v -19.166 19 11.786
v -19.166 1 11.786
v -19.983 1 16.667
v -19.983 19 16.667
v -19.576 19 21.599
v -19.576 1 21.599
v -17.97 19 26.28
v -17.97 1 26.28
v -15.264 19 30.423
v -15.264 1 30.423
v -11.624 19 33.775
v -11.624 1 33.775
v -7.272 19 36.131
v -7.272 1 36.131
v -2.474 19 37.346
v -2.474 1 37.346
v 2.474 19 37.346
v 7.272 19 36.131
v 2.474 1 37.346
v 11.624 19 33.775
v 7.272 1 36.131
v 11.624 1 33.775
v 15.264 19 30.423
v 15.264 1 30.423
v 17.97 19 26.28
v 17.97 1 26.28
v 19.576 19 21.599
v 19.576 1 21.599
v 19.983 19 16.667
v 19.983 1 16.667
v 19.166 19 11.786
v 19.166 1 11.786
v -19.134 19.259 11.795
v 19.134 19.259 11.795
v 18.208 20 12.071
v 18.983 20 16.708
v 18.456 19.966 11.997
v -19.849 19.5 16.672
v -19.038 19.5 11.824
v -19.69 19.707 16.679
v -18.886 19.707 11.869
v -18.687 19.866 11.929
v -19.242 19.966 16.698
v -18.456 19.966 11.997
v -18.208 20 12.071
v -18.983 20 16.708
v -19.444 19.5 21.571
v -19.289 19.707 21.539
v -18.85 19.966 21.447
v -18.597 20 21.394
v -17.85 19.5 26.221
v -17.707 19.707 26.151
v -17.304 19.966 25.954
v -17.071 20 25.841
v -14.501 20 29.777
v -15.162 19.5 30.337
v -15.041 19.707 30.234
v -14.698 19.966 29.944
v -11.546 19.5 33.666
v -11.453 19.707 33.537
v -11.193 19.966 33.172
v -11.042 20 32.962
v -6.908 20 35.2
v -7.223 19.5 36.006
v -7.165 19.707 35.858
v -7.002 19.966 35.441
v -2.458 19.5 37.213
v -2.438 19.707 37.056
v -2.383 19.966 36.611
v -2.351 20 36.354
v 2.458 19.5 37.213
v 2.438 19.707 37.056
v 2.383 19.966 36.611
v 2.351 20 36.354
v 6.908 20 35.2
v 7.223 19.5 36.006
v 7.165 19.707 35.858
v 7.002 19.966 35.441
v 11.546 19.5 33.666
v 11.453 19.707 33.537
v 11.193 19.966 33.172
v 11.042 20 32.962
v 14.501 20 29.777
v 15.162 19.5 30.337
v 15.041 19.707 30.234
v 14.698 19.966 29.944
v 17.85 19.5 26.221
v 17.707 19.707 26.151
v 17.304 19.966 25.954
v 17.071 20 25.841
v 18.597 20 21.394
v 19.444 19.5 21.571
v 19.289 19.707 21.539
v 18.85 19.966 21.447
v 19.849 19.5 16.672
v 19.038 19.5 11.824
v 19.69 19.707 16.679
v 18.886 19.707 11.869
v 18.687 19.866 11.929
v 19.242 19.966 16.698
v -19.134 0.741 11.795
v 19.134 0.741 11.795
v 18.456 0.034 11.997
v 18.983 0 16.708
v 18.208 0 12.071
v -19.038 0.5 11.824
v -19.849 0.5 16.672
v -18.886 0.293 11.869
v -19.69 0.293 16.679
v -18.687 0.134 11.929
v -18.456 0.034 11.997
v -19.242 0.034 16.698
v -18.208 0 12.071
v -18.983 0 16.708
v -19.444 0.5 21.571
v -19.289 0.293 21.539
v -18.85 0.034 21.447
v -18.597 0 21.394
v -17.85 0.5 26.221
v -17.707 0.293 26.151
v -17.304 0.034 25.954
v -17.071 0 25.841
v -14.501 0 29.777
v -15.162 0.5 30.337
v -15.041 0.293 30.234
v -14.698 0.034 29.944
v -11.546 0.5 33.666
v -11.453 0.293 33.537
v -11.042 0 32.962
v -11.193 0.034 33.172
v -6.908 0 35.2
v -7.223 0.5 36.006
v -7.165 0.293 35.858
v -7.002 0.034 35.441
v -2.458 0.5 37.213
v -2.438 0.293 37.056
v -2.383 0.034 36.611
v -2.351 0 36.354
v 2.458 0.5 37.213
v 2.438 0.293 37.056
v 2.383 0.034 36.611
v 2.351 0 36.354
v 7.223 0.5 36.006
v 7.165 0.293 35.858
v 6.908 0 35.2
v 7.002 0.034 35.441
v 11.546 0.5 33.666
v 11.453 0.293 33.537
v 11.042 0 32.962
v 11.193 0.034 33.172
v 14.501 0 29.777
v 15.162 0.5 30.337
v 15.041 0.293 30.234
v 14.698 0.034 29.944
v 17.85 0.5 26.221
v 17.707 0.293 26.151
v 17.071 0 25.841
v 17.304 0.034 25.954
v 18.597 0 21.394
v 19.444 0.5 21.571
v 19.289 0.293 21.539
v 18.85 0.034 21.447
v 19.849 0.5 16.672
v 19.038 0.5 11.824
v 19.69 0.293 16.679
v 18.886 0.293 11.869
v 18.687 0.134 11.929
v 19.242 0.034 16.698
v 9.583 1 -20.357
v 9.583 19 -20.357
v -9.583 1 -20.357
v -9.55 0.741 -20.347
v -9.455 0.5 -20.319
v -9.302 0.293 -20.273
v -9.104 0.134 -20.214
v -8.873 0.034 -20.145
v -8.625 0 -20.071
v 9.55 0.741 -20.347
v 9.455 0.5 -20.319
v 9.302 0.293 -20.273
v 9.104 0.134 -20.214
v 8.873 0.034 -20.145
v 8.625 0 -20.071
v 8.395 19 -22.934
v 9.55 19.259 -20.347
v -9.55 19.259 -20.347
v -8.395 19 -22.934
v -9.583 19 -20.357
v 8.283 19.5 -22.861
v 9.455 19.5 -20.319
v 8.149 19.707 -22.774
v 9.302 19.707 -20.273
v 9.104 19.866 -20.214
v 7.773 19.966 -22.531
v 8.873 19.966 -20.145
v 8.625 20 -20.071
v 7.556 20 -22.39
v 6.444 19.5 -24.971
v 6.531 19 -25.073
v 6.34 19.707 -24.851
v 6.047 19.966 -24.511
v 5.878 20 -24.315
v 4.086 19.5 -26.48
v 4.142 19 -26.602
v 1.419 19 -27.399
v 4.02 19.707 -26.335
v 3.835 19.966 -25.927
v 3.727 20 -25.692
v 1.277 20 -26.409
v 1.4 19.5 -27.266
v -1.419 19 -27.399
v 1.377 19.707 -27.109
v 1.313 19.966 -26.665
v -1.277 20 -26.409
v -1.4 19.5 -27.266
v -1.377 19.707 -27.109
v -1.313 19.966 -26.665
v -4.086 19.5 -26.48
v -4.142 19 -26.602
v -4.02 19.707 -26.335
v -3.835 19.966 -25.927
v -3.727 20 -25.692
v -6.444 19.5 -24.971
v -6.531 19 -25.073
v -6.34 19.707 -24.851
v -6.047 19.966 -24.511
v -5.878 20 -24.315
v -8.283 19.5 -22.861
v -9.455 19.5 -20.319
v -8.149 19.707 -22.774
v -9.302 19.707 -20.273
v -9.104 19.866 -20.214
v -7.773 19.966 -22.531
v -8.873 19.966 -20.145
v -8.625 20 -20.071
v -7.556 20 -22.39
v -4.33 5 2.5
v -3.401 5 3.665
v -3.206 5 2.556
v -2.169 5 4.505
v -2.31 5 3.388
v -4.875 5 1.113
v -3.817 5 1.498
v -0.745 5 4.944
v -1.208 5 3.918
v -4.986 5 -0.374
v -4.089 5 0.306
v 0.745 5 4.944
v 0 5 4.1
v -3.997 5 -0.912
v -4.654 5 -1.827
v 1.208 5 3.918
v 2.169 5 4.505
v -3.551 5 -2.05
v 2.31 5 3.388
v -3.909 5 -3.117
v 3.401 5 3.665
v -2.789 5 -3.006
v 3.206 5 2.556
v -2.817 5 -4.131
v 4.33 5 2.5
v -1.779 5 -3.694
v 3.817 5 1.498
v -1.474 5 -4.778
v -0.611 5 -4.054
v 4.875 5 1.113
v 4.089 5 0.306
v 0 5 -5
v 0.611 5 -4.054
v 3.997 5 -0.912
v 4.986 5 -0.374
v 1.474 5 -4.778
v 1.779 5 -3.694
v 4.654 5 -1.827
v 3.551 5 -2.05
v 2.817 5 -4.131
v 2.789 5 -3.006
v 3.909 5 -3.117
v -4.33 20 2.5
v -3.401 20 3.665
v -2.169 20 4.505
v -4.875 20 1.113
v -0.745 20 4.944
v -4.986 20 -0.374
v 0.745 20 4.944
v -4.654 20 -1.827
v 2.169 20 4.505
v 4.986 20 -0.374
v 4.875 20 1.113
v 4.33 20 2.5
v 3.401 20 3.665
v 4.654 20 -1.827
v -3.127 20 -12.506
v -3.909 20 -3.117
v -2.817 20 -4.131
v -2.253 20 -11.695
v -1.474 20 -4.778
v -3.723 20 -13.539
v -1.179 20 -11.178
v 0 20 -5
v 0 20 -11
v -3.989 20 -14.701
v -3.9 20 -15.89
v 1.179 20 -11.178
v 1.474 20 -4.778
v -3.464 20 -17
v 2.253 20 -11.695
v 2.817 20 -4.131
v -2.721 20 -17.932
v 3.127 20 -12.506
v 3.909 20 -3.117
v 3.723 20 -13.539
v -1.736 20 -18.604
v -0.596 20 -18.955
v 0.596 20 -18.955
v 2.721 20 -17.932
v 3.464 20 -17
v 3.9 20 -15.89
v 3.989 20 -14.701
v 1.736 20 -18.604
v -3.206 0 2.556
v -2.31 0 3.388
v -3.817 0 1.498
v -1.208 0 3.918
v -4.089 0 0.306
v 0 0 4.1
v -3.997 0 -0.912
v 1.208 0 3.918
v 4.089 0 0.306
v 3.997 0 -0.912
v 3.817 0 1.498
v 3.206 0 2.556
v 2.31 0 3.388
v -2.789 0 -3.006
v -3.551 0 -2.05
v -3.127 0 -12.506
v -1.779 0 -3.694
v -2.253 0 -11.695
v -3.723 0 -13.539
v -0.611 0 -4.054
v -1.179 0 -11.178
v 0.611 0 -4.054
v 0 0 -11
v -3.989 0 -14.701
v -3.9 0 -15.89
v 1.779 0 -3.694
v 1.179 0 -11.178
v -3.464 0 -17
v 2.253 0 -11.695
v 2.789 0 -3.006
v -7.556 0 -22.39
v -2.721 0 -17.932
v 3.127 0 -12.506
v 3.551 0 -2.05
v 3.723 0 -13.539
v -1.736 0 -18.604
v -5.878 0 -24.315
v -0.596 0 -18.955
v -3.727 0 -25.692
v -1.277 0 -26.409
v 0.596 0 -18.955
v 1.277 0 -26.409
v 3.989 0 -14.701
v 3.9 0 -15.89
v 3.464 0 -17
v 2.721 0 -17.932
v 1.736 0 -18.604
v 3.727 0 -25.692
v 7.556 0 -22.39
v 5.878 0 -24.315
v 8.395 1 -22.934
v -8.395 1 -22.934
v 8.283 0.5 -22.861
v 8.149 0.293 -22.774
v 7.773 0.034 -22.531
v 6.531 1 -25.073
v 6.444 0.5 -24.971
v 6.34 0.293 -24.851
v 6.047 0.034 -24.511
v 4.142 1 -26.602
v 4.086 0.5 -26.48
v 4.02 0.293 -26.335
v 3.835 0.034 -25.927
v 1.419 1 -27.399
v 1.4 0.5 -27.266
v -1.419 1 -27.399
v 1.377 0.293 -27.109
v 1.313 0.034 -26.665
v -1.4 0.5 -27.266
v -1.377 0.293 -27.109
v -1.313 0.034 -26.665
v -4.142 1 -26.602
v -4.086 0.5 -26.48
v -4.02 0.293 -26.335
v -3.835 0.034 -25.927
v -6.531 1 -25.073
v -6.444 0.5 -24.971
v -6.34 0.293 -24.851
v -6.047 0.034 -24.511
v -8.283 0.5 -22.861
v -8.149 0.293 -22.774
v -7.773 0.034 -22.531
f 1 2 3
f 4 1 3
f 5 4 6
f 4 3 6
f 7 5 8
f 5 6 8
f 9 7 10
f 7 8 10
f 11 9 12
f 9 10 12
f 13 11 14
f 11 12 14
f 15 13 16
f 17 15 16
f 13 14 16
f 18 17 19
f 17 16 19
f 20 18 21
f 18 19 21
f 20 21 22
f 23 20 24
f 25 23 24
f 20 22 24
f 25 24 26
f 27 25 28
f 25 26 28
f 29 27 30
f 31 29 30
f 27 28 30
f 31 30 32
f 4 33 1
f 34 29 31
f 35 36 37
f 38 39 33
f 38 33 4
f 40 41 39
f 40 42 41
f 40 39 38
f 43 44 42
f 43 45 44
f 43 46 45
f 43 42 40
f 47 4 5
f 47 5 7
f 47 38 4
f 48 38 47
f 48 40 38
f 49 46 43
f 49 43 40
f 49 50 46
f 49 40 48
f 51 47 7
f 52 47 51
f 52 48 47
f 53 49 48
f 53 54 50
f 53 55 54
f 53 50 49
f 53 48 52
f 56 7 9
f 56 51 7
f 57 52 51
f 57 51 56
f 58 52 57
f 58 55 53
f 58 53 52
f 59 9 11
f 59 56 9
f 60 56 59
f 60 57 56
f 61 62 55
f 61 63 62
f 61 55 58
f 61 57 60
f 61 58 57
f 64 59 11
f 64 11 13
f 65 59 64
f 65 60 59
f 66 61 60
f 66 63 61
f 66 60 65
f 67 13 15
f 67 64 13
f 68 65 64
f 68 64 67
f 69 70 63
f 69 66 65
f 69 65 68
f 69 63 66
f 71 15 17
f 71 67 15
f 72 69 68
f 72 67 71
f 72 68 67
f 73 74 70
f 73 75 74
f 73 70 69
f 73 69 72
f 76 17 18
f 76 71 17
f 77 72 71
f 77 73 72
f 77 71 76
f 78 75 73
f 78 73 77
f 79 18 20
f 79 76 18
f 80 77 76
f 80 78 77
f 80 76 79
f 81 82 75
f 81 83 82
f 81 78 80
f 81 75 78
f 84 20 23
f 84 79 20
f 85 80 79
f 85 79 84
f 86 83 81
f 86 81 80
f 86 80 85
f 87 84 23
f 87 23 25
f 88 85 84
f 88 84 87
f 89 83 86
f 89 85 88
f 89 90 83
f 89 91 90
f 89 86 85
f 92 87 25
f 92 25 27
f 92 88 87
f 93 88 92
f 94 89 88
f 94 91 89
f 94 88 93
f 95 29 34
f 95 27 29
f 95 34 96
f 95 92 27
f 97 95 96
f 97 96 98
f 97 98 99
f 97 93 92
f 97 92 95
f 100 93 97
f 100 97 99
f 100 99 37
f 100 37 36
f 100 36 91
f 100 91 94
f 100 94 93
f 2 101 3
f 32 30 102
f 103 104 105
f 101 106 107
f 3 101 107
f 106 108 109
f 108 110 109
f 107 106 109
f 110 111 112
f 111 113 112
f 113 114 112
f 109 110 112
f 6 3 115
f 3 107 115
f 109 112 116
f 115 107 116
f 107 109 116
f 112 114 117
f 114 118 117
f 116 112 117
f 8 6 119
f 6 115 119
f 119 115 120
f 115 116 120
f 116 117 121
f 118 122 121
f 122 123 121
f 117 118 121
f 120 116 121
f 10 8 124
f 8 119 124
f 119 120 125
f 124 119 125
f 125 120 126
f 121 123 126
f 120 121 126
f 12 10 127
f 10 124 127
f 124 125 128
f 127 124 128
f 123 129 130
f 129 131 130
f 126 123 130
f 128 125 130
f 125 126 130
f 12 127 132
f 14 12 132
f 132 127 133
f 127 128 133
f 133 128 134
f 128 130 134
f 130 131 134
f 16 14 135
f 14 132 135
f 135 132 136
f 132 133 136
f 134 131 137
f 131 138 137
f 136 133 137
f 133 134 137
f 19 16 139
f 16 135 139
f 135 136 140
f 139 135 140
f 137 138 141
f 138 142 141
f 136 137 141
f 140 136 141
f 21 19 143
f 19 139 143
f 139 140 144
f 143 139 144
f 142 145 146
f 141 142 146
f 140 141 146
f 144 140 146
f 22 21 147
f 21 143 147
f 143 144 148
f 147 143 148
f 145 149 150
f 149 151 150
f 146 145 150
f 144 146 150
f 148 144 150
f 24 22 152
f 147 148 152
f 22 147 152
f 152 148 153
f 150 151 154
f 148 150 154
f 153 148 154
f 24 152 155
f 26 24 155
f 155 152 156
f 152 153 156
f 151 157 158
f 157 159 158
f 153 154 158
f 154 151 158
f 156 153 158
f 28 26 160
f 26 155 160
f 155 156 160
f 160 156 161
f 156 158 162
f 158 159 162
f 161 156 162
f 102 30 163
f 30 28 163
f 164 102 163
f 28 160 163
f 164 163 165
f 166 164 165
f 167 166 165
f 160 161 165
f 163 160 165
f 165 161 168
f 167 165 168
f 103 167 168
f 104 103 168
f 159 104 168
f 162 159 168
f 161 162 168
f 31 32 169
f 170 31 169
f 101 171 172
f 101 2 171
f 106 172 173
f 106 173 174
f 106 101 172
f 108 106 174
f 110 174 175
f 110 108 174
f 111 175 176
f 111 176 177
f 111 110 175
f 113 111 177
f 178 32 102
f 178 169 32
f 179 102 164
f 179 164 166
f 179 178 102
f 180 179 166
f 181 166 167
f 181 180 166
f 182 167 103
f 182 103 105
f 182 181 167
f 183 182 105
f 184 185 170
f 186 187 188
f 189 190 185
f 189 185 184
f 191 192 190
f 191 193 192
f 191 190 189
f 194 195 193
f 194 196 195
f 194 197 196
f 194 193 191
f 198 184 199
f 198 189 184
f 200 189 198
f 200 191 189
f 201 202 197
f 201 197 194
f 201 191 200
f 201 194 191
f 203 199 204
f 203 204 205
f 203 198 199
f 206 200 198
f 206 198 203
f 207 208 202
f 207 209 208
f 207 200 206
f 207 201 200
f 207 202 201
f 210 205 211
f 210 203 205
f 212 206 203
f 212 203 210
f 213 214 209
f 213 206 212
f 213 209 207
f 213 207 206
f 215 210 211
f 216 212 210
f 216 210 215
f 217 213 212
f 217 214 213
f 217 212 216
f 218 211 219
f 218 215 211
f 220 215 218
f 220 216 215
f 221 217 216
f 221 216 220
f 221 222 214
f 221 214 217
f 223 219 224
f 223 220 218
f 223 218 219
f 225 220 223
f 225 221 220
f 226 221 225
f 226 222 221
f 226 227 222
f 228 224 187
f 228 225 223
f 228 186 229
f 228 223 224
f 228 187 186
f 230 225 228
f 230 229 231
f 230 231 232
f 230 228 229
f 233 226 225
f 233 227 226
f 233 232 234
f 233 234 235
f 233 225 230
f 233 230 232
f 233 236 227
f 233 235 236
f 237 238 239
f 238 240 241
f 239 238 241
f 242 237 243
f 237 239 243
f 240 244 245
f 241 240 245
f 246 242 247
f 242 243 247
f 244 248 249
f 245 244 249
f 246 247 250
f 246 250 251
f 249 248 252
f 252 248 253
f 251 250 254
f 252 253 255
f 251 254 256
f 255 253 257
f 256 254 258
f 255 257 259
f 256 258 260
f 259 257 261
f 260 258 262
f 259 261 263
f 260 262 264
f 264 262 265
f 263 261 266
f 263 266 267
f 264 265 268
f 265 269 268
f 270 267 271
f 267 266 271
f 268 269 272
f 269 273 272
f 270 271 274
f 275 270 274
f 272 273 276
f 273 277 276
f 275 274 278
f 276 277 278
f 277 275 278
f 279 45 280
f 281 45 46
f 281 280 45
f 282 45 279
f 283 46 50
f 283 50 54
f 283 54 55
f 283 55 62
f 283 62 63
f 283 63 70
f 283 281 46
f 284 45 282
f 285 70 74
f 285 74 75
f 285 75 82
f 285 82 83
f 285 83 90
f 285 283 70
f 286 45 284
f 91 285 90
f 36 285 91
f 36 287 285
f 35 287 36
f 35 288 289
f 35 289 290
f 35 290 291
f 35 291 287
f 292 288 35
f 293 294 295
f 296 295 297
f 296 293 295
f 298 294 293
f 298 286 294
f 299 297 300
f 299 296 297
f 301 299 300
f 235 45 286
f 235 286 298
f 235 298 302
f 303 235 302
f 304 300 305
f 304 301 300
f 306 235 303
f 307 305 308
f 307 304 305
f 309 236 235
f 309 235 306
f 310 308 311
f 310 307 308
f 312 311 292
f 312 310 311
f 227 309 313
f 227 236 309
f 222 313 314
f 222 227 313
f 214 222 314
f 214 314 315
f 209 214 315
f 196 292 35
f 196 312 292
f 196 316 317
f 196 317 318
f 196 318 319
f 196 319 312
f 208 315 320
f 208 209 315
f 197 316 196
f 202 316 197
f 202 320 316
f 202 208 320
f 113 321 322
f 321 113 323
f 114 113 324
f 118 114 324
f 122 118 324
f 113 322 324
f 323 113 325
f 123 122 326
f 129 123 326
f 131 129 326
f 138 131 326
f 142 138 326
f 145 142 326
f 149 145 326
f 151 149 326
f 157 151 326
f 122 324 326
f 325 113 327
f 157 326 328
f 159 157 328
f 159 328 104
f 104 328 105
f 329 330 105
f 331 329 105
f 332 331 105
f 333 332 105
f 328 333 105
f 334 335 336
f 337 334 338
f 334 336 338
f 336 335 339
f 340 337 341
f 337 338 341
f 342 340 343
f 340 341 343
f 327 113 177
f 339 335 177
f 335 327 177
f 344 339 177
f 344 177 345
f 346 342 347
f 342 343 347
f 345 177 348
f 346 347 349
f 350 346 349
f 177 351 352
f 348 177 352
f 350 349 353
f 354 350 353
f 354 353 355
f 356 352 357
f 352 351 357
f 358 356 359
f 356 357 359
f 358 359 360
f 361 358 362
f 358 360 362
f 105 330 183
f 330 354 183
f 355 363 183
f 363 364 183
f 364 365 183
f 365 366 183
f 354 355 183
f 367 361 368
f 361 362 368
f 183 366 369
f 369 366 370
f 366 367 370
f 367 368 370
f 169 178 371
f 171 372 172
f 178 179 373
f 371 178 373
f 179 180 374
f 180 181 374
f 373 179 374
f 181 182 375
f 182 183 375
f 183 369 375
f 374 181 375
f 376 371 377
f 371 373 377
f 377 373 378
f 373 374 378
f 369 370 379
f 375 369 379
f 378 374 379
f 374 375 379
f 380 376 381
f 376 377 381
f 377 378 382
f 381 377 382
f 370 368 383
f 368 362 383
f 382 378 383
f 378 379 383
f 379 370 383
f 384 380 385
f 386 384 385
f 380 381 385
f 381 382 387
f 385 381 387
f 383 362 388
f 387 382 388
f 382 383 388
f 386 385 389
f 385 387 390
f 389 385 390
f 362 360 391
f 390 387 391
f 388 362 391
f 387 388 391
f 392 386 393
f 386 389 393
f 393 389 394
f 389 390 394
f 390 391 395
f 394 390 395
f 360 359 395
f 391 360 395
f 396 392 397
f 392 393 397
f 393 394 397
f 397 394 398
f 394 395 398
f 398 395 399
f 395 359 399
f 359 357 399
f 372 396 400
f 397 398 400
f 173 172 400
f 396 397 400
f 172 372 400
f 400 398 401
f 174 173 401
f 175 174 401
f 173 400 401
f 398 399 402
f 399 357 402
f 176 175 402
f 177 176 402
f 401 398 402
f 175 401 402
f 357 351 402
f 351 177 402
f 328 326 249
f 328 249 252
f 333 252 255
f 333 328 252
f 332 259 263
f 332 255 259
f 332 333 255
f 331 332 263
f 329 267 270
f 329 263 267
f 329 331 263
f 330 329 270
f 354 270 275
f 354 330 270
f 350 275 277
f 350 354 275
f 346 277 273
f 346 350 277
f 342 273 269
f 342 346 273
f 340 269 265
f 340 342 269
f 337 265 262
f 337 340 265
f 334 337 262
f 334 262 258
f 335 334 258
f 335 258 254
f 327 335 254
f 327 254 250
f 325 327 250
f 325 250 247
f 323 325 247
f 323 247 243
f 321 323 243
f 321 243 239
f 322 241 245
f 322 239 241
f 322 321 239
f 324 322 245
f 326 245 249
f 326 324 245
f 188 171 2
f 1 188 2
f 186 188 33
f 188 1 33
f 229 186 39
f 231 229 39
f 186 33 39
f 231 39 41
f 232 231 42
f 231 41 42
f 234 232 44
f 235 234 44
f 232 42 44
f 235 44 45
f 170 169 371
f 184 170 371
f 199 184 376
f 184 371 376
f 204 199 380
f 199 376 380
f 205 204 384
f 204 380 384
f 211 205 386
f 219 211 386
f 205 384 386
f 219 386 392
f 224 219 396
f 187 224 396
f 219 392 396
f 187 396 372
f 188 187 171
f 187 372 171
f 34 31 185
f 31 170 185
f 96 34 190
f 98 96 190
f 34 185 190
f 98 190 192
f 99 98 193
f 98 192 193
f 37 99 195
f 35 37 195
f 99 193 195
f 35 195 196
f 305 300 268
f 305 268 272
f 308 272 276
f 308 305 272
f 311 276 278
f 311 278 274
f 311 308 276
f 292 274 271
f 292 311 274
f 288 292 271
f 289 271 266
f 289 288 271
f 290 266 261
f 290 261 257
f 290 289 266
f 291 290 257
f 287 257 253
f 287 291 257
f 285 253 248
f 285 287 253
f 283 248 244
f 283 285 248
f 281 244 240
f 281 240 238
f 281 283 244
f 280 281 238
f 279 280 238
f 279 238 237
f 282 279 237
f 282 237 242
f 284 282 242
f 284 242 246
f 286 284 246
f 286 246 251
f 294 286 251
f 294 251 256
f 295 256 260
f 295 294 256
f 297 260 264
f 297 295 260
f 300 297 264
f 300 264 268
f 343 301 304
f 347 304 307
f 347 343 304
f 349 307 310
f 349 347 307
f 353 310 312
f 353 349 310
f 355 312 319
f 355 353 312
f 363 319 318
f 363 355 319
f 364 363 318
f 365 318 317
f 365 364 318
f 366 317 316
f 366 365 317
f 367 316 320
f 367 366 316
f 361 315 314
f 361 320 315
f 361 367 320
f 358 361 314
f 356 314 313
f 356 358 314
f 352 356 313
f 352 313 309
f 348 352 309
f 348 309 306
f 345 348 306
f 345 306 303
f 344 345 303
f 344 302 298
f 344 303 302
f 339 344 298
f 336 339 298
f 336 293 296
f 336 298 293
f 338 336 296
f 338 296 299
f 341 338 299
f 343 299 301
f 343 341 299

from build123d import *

# Parameters (mm, degrees)
BOSS_EXTRUDE1_DEPTH     = 20
FILLET1_R               = 1
SKETCH2_R               = 4
CUT_EXTRUDE1_DEPTH      = 15
SKETCH3_R               = 5
CUT_EXTRUDE2_DEPTH      = 15
CUT_EXTRUDE3_DEPTH      = 46.069390988
CUT_EXTRUDE3_DEPTH_BACK = 46.069390988
SKETCH4_R               = 4.1
SKETCH4_R_2             = 4


with BuildPart() as part:
    # Sketch1 → Boss-Extrude1 (new body)
    with BuildSketch(Plane(origin=(0, 0, 0), x_dir=(1, 0, 0), z_dir=(0, 1, 0))):
        with BuildLine():
            Line((-9.583148475, 20.357142857), (-19.16629695, -11.785714286))
            ThreePointArc((-19.16629695, -11.785714286), (0, -37.5), (19.16629695, -11.785714286))
            Line((19.16629695, -11.785714286), (9.583148475, 20.357142857))
            ThreePointArc((9.583148475, 20.357142857), (0, 27.5), (-9.583148475, 20.357142857))
        make_face()
    extrude(amount=BOSS_EXTRUDE1_DEPTH)

    # Fillet1
    fillet1_edges = [part.edges().sort_by_distance(p)[0] for p in [
        (0, 20, -27.5),
        (-14.374722712, 20, -4.285714286),
        (0, 20, 37.5),
        (-14.374722712, 0, -4.285714286),
        (0, 0, -27.5),
        (14.374722712, 0, -4.285714286),
        (0, 0, 37.5),
        (14.374722712, 20, -4.285714286),
    ]]
    fillet(fillet1_edges, radius=FILLET1_R)

    # Sketch2 → Cut-Extrude1 (cut)
    with BuildSketch(Plane(origin=(0, 0, 0), x_dir=(1, 0, 0), z_dir=(0, 1, 0))):
        with Locations(Location((0, 15, 0), (0, 0, 270))):
            Circle(SKETCH2_R)
    extrude(amount=CUT_EXTRUDE1_DEPTH, mode=Mode.SUBTRACT)

    # Sketch3 → Cut-Extrude2 (cut)
    with BuildSketch(Plane.XZ.offset(-20)):
        with Locations(Location((0, 0, 0), (0, 0, 270))):
            Circle(SKETCH3_R)
    extrude(amount=CUT_EXTRUDE2_DEPTH, mode=Mode.SUBTRACT)

    # Sketch4 → Cut-Extrude3 (cut, two sides: drawn at the far end of the back side and taken through both)
    with BuildSketch(Plane(origin=(0, 5, 0), x_dir=(-1, 0, 0), z_dir=(0, 1, 0)).offset(-CUT_EXTRUDE3_DEPTH_BACK)):
        with Locations(Location((0, 0, 0), (0, 0, 90))):
            Circle(SKETCH4_R)
        with Locations(Location((0, -15, 0), (0, 0, 90))):
            Circle(SKETCH4_R_2)
    extrude(amount=CUT_EXTRUDE3_DEPTH + CUT_EXTRUDE3_DEPTH_BACK, mode=Mode.SUBTRACT)


solid = part.part
